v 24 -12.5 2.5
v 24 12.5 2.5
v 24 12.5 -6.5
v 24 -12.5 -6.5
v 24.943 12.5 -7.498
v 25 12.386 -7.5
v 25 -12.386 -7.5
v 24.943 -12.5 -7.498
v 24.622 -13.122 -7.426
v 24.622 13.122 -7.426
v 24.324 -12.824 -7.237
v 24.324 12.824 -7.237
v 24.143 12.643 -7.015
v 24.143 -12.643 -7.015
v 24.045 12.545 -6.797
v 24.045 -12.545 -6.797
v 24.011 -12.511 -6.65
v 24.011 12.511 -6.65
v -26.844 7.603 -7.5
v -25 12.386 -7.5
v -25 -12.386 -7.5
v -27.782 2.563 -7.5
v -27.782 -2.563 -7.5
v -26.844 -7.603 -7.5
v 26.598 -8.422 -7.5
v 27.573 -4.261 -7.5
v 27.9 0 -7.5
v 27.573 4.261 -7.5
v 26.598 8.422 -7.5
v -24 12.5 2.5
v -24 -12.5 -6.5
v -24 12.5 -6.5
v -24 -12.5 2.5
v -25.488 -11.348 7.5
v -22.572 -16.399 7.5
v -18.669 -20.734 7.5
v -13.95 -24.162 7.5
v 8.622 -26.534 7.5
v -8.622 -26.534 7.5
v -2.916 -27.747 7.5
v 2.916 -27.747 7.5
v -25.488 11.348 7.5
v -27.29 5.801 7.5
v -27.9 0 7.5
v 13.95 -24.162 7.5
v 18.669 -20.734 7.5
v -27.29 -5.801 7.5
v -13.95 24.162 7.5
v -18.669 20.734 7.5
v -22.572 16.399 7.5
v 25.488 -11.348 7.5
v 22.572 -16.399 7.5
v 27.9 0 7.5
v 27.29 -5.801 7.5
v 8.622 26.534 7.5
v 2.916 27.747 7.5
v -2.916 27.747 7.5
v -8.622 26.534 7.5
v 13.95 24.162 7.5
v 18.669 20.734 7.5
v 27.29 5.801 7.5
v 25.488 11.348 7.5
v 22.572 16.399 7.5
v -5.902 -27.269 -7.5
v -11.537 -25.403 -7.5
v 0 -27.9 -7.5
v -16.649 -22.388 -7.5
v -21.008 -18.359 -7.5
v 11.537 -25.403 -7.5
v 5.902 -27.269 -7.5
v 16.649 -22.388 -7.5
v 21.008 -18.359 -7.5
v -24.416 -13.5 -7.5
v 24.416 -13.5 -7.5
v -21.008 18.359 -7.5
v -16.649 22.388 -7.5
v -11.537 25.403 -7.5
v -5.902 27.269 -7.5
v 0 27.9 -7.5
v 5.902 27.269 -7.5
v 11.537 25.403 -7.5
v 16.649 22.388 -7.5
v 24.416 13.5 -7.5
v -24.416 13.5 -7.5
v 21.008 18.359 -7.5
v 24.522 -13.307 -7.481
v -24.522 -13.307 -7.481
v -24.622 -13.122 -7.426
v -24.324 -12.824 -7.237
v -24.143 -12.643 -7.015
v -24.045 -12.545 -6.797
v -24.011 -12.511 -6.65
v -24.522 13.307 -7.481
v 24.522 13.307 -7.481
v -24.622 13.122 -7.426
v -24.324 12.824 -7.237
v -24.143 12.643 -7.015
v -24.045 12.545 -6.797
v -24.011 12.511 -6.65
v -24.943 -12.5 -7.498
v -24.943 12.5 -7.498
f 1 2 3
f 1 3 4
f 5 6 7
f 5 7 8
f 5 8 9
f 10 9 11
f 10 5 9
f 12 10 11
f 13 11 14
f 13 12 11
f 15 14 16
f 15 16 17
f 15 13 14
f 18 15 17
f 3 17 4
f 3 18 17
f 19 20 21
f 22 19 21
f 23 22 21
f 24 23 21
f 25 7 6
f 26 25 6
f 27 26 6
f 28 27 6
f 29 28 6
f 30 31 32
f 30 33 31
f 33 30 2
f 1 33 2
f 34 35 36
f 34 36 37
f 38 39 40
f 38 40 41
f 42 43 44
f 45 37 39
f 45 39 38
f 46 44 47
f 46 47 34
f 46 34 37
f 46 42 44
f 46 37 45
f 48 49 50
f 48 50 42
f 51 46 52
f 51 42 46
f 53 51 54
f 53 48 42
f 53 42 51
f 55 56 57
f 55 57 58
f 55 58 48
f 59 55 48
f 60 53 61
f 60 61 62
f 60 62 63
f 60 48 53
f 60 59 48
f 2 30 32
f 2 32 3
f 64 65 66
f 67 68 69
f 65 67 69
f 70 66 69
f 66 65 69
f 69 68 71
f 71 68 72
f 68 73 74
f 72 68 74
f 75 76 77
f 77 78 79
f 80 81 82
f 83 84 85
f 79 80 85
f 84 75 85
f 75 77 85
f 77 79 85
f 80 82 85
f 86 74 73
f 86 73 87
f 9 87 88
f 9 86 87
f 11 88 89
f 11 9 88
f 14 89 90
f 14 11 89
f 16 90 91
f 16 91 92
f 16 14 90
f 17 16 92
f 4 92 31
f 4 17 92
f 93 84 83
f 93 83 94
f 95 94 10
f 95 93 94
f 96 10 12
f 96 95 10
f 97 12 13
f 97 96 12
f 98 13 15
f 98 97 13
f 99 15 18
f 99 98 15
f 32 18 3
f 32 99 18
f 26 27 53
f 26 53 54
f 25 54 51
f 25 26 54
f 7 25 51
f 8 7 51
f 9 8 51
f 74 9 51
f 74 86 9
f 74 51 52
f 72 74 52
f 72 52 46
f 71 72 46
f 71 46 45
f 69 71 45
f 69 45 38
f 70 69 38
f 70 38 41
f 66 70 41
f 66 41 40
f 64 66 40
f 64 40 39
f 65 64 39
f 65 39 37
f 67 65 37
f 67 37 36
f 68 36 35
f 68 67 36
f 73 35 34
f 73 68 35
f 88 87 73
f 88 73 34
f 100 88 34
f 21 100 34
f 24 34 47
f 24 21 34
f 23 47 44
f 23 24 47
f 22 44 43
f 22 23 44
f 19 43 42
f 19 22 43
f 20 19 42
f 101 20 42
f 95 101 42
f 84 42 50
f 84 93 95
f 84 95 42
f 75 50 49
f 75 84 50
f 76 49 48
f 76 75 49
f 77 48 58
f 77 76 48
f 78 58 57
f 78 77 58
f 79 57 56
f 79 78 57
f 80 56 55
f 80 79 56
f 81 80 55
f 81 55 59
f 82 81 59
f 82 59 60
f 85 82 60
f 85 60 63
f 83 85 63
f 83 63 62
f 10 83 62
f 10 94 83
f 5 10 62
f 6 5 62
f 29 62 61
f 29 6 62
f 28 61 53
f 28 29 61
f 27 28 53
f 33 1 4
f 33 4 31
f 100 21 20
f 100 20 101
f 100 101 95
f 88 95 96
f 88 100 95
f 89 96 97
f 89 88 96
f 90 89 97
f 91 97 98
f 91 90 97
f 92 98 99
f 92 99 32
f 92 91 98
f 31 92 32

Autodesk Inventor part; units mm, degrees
ref_plane "YZ Plane" through (0, 0, 0) normal (1, 0, 0) x (0, 1, 0)
ref_plane "XZ Plane" through (0, 0, 0) normal (0, 1, 0) x (-1, 0, 0)
ref_plane "XY Plane" through (0, 0, 0) normal (0, 0, 1) x (1, 0, 0)
sketch "Sketch1" plane through (0, 0, 0) normal (0, 0, 1) x (1, 0, 0)
  circle A0 centre (0, 0) radius 27.9
  line L0 (-24, 12.5) -> (24, 12.5)
  line L1 (24, 12.5) -> (24, -12.5)
  line L2 (24, -12.5) -> (-24, -12.5)
  line L3 (-24, -12.5) -> (-24, 12.5)
  dimension "d0" = 55.8
  dimension "d1" = 48
  dimension "d2" = 24
  dimension "d3" = 25
  dimension "d4" = 12.5
extrude "Extrusion1" add sketch "Sketch1" along normal mid plane 15
sketch "Sketch2" plane through (0, 0, 7.5) normal (0, 0, 1) x (1, 0, 0)
  circle A0 centre (0, 0) radius 27.9
  dimension "d10" = 55.8
extrude "Extrusion2" add sketch "Sketch2" against normal blind 5
fillet "Fillet1" radius 1 4 edges at (-24, 0, -7.5) (0, 12.5, -7.5) (0, -12.5, -7.5) (24, 0, -7.5)
equation "\"d2\" = 0.5 * d1"
equation "\"d4\" = 0.5 * d3"
properties part number "soporte base pila"
